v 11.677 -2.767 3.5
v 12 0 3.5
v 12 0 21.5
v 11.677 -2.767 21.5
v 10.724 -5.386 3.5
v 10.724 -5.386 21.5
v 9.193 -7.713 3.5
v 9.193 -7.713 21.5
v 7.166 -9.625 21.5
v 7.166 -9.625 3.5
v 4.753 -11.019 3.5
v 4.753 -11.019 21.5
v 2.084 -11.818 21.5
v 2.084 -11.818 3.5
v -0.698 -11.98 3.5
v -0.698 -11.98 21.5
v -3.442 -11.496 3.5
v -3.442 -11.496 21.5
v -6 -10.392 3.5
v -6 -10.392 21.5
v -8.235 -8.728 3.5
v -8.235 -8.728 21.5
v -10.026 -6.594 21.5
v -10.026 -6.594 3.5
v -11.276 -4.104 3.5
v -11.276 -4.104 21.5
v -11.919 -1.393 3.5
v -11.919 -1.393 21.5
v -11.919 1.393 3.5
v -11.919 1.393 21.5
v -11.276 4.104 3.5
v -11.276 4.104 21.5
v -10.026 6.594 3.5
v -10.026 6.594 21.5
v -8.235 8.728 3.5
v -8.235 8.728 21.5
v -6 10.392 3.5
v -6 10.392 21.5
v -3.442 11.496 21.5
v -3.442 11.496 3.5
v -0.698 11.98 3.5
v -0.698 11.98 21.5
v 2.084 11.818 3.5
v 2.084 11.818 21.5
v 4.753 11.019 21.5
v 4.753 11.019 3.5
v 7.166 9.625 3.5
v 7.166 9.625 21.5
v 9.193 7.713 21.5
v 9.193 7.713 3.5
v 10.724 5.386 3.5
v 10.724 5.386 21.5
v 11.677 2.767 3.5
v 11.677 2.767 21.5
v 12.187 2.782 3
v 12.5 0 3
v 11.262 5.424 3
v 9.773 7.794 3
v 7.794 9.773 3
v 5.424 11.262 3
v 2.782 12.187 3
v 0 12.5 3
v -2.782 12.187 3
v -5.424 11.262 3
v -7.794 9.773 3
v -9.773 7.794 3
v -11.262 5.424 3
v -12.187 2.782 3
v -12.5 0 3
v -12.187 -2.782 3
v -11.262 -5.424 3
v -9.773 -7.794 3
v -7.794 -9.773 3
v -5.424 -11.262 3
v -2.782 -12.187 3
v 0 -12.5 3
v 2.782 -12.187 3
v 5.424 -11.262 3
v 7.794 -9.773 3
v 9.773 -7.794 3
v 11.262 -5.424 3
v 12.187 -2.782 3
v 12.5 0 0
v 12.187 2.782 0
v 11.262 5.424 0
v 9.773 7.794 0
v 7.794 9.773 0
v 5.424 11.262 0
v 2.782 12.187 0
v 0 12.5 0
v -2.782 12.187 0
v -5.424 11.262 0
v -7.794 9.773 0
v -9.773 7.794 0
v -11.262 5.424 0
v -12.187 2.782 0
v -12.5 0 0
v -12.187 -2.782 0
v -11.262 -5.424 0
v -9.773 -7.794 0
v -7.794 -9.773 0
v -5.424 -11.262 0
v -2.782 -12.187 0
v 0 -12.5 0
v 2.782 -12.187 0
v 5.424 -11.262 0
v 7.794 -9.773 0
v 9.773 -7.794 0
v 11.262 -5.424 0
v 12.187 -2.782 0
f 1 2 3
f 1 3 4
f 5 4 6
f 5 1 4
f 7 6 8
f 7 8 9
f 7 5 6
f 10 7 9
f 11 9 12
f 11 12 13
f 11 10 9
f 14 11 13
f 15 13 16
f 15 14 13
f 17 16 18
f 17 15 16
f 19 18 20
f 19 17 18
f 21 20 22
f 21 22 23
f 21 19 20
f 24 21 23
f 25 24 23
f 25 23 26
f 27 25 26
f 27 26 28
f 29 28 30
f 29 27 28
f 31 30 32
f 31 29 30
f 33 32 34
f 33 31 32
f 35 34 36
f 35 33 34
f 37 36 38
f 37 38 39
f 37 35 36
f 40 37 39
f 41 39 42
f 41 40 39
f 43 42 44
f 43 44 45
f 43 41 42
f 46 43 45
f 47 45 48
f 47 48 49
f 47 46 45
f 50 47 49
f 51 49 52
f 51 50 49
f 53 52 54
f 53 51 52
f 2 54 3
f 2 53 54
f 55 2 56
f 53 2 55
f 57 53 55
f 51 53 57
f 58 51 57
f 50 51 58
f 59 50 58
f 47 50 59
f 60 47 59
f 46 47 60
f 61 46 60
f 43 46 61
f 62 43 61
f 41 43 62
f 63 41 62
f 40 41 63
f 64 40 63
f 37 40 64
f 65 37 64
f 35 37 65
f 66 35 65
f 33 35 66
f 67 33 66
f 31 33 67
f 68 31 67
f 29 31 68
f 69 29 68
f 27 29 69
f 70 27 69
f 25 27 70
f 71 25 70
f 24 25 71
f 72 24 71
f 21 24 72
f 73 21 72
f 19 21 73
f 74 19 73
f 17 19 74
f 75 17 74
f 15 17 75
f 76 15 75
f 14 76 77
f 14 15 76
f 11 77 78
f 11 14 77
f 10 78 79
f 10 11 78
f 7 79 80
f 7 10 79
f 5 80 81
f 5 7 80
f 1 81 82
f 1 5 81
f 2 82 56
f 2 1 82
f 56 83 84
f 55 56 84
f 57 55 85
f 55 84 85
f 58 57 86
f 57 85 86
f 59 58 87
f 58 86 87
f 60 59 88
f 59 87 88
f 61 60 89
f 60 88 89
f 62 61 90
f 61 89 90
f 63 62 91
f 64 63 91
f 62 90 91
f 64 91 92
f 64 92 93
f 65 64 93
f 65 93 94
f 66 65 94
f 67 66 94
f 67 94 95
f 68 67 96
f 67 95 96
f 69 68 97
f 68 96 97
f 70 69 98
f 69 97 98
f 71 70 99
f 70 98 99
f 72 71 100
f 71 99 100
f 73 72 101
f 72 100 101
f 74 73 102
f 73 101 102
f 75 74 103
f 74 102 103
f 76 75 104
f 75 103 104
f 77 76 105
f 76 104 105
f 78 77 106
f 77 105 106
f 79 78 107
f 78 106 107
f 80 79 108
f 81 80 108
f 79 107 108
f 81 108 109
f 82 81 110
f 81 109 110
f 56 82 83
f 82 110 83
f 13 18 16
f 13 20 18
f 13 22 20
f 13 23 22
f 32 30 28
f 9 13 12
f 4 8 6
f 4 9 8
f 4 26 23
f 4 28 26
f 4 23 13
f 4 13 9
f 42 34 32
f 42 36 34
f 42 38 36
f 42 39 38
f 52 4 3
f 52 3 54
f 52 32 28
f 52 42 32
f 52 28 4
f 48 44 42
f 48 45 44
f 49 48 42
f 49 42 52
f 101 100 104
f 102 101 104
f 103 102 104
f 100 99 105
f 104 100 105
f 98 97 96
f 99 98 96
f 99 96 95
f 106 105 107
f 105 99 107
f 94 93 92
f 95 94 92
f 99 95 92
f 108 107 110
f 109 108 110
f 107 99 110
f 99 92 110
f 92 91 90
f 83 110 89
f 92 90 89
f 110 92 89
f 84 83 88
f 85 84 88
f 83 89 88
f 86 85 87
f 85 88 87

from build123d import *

# Parameters (mm, degrees)
F0_R      = 12.5
F1_DEPTH  = 3
F1_FACE_R = 12.5
F2_DEPTH  = 0.5
F2_TAPER  = 45
F3_DEPTH  = 18


with BuildPart() as f1:
    # F0 (on Top) → F1 (new body)
    with BuildSketch(Plane.XY):
        Circle(F0_R)
    extrude(amount=F1_DEPTH)

    # F1_face (on face) → F2 (join)
    with BuildSketch(Plane.XY.offset(3)):
        Circle(F1_FACE_R)
    extrude(amount=F2_DEPTH, taper=F2_TAPER)

    # F3 (add): a face of the model
    f3_faces = [f1.faces().sort_by_distance(p)[0] for p in [
        (0, 0, 3.5),
    ]]
    extrude(f3_faces, amount=F3_DEPTH)


solid = f1.part
